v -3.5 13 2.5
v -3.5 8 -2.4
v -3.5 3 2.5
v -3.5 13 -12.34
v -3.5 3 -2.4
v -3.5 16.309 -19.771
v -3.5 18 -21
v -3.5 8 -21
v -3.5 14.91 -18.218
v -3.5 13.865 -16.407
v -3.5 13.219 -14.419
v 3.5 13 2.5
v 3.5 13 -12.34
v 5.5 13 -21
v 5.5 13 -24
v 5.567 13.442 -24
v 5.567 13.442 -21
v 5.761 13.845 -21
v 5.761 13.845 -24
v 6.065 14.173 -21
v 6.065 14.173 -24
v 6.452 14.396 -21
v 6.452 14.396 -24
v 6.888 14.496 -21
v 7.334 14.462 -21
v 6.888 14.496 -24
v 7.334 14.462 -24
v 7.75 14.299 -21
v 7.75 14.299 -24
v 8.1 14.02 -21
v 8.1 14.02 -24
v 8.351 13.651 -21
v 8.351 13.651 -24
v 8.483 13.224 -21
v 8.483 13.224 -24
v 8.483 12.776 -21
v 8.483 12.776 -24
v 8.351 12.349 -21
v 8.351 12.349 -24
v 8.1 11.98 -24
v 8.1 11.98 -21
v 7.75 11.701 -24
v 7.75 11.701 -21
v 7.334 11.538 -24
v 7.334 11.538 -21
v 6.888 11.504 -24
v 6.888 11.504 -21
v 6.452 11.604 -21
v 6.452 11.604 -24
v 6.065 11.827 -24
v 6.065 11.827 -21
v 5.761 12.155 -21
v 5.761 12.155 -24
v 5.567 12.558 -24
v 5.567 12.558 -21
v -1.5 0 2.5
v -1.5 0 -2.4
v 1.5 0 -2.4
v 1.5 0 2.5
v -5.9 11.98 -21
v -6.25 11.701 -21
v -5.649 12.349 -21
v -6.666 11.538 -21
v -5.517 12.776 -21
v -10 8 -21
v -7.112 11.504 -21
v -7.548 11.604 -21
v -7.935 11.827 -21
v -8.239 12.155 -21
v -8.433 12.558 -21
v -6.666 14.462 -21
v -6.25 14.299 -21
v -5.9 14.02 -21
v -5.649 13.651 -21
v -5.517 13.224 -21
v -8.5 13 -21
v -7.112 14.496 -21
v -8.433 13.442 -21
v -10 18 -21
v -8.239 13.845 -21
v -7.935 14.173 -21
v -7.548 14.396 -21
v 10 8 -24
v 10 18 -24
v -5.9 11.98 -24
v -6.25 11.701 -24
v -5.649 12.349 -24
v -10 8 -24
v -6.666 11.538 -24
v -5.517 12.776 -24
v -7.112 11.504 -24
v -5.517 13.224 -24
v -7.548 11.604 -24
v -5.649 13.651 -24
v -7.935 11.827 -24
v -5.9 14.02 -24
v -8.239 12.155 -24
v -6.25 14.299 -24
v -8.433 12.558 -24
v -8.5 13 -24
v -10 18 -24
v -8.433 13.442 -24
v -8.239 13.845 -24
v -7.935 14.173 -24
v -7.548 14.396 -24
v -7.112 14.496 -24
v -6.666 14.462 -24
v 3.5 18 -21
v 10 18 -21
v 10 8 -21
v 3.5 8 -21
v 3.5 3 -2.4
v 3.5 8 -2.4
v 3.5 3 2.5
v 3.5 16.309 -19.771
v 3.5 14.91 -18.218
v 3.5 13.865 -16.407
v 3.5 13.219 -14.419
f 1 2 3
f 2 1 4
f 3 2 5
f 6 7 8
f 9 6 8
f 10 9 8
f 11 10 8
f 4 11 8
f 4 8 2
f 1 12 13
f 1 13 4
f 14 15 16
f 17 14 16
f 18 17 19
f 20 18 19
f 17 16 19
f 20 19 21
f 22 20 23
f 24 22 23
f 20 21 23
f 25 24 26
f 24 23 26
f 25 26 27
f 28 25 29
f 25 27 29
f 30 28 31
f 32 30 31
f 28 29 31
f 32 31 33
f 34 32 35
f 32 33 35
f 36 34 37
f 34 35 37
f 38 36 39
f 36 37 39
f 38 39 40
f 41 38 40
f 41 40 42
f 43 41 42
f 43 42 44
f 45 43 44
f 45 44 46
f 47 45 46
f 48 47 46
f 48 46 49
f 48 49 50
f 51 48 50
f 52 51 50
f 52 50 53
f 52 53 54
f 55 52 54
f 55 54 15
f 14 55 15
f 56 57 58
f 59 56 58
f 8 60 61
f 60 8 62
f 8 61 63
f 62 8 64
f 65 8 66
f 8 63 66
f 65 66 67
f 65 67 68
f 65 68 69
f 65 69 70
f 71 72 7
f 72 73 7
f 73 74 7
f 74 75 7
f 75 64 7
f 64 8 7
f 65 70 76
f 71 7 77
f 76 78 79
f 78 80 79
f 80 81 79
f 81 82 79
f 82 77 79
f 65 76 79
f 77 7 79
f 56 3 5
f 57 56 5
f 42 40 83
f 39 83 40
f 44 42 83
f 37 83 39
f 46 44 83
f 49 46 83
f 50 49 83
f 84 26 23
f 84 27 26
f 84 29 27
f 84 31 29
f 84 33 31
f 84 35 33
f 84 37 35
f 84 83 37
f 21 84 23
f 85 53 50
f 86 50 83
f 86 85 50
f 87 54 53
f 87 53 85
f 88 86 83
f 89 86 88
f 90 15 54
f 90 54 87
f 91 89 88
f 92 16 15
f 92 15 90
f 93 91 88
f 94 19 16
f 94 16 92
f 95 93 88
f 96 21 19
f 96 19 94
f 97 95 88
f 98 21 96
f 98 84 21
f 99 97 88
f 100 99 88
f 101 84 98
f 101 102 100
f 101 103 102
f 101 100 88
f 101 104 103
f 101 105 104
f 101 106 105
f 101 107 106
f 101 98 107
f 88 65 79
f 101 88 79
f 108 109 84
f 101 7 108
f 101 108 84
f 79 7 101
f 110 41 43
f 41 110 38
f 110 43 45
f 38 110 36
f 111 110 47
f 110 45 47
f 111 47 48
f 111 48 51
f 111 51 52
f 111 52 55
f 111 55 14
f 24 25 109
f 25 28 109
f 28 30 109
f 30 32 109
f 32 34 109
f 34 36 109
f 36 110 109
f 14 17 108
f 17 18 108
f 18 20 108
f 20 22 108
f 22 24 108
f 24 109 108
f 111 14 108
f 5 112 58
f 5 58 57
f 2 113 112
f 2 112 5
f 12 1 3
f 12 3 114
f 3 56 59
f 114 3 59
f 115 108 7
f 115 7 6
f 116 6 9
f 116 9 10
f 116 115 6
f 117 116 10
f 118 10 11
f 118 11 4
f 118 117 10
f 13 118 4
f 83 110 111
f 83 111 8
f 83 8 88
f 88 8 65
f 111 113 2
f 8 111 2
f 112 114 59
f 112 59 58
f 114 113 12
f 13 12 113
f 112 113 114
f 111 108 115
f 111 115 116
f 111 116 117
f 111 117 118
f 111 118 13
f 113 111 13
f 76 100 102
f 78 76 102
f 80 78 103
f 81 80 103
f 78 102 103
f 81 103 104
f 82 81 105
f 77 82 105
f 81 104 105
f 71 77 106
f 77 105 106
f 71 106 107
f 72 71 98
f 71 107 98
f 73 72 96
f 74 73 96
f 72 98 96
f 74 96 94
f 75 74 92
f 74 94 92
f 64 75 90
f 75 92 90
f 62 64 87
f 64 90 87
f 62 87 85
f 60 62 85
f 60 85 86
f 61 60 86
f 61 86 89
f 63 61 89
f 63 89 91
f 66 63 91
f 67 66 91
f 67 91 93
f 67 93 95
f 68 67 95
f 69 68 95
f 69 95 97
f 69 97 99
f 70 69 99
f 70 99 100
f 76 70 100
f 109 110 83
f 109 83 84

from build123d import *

# Parameters (mm, degrees)
SKETCH_1_W          = 7
SKETCH_1_H          = 5
EXTRUDE_1_DEPTH     = 13
SKETCH_2_W          = 7
SKETCH_2_H          = 5
EXTRUDE_2_DEPTH     = 18.5
SKETCH_4_W          = 20
SKETCH_4_H          = 10
EXTRUDE_3_DEPTH     = 3
SKETCH_5_R          = 1.5
CUT_EXTRUDE_1_DEPTH = 34.559648389
FILLET_1_R          = 10
SKETCH_6_W          = 7
SKETCH_6_H          = 8
CUT_EXTRUDE_2_DEPTH = 0.1
CHAMFER_3_SIZE      = 2
CHAMFER_3_SIZE2     = 3


with BuildPart() as part:
    # 草图1 → 凸台-拉伸1 (new body)
    with BuildSketch(Plane(origin=(0, 0, 0), x_dir=(1, 0, 0), z_dir=(0, 1, 0))):
        Rectangle(SKETCH_1_W, SKETCH_1_H)
    extrude(amount=EXTRUDE_1_DEPTH)

    # 草图2 → 凸台-拉伸2 (add)
    with BuildSketch(Plane(origin=(0, 0, -2.5), x_dir=(-1, 0, 0), z_dir=(0, 0, -1))):
        with Locations((0, 10.5)):
            Rectangle(SKETCH_2_W, SKETCH_2_H)
    extrude(amount=EXTRUDE_2_DEPTH)

    # 草图4 → 凸台-拉伸3 (add)
    with BuildSketch(Plane(origin=(0, 0, -21), x_dir=(-1, 0, 0), z_dir=(0, 0, -1))):
        with Locations((0, 13)):
            Rectangle(SKETCH_4_W, SKETCH_4_H)
    extrude(amount=EXTRUDE_3_DEPTH)

    # 草图5 → 切除-拉伸1 (cut, through all)
    with BuildSketch(Plane(origin=(0, 0, -24), x_dir=(-1, 0, 0), z_dir=(0, 0, -1))):
        with Locations((-7, 13)):
            Circle(SKETCH_5_R)
        with Locations((7, 13)):
            Circle(SKETCH_5_R)
    extrude(amount=-CUT_EXTRUDE_1_DEPTH, mode=Mode.SUBTRACT)

    # 圆角1
    # the kernel refuses this fillet: 10 mm, written as the material it adds along each edge
    with BuildSketch(Plane(origin=(3.5, 13, -21), x_dir=(0, 1, 0), z_dir=(-1, 0, 0))) as fillet_1_piece_1:
        with BuildLine():
            CenterArc((10, -8.660254038), FILLET_1_R, 120, 60)
            Line((0, -8.660254038), (-0.2, -8.660254038))
            Line((-0.2, -8.660254038), (-0.2, 0))
            Line((-0.2, 0), (0, 0.2))
            ThreePointArc((0, 0.2), (2.5, 0.2), (4.9, 0.173205081))
            Line((4.9, 0.173205081), (5, 0))
        make_face()
    extrude(amount=7)

    # 草图6 → 切除-拉伸2 (cut)
    with BuildSketch(Plane(origin=(0, 0, -2.5), x_dir=(-1, 0, 0), z_dir=(0, 0, -1))):
        with Locations((0, 4)):
            Rectangle(SKETCH_6_W, SKETCH_6_H)
    extrude(amount=-CUT_EXTRUDE_2_DEPTH, mode=Mode.SUBTRACT)

    # 倒角3
    chamfer_3_edges = [part.edges().sort_by_distance(p)[0] for p in [
        (3.5, 0, 0.05),
        (-3.5, 0, 0.05),
    ]]
    chamfer_3_side = [part.faces().sort_by_distance(p)[0] for p in [
        (0, 0, 0.05),
    ]]
    chamfer(chamfer_3_edges, length=CHAMFER_3_SIZE, length2=CHAMFER_3_SIZE2, reference=chamfer_3_side[0])


solid = part.part
